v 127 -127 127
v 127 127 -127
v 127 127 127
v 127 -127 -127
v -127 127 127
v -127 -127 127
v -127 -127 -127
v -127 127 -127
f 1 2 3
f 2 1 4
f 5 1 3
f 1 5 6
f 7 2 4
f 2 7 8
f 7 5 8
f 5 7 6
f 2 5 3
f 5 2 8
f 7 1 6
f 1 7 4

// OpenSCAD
//Author: Chris Correll
//Date: 9/1/2022
//Description: Cubes of scale for 3d pritning 

inch_multiplier = 2.54;
scales = [1,10,100];

//Millimeters
for(i = [0:len(scales)-1]){
cube(scales[i],center=true);
}

//Inches
for( i = [0:len(scales)-1]){
cube((scales[i]*inch_multiplier),center=true);
}
